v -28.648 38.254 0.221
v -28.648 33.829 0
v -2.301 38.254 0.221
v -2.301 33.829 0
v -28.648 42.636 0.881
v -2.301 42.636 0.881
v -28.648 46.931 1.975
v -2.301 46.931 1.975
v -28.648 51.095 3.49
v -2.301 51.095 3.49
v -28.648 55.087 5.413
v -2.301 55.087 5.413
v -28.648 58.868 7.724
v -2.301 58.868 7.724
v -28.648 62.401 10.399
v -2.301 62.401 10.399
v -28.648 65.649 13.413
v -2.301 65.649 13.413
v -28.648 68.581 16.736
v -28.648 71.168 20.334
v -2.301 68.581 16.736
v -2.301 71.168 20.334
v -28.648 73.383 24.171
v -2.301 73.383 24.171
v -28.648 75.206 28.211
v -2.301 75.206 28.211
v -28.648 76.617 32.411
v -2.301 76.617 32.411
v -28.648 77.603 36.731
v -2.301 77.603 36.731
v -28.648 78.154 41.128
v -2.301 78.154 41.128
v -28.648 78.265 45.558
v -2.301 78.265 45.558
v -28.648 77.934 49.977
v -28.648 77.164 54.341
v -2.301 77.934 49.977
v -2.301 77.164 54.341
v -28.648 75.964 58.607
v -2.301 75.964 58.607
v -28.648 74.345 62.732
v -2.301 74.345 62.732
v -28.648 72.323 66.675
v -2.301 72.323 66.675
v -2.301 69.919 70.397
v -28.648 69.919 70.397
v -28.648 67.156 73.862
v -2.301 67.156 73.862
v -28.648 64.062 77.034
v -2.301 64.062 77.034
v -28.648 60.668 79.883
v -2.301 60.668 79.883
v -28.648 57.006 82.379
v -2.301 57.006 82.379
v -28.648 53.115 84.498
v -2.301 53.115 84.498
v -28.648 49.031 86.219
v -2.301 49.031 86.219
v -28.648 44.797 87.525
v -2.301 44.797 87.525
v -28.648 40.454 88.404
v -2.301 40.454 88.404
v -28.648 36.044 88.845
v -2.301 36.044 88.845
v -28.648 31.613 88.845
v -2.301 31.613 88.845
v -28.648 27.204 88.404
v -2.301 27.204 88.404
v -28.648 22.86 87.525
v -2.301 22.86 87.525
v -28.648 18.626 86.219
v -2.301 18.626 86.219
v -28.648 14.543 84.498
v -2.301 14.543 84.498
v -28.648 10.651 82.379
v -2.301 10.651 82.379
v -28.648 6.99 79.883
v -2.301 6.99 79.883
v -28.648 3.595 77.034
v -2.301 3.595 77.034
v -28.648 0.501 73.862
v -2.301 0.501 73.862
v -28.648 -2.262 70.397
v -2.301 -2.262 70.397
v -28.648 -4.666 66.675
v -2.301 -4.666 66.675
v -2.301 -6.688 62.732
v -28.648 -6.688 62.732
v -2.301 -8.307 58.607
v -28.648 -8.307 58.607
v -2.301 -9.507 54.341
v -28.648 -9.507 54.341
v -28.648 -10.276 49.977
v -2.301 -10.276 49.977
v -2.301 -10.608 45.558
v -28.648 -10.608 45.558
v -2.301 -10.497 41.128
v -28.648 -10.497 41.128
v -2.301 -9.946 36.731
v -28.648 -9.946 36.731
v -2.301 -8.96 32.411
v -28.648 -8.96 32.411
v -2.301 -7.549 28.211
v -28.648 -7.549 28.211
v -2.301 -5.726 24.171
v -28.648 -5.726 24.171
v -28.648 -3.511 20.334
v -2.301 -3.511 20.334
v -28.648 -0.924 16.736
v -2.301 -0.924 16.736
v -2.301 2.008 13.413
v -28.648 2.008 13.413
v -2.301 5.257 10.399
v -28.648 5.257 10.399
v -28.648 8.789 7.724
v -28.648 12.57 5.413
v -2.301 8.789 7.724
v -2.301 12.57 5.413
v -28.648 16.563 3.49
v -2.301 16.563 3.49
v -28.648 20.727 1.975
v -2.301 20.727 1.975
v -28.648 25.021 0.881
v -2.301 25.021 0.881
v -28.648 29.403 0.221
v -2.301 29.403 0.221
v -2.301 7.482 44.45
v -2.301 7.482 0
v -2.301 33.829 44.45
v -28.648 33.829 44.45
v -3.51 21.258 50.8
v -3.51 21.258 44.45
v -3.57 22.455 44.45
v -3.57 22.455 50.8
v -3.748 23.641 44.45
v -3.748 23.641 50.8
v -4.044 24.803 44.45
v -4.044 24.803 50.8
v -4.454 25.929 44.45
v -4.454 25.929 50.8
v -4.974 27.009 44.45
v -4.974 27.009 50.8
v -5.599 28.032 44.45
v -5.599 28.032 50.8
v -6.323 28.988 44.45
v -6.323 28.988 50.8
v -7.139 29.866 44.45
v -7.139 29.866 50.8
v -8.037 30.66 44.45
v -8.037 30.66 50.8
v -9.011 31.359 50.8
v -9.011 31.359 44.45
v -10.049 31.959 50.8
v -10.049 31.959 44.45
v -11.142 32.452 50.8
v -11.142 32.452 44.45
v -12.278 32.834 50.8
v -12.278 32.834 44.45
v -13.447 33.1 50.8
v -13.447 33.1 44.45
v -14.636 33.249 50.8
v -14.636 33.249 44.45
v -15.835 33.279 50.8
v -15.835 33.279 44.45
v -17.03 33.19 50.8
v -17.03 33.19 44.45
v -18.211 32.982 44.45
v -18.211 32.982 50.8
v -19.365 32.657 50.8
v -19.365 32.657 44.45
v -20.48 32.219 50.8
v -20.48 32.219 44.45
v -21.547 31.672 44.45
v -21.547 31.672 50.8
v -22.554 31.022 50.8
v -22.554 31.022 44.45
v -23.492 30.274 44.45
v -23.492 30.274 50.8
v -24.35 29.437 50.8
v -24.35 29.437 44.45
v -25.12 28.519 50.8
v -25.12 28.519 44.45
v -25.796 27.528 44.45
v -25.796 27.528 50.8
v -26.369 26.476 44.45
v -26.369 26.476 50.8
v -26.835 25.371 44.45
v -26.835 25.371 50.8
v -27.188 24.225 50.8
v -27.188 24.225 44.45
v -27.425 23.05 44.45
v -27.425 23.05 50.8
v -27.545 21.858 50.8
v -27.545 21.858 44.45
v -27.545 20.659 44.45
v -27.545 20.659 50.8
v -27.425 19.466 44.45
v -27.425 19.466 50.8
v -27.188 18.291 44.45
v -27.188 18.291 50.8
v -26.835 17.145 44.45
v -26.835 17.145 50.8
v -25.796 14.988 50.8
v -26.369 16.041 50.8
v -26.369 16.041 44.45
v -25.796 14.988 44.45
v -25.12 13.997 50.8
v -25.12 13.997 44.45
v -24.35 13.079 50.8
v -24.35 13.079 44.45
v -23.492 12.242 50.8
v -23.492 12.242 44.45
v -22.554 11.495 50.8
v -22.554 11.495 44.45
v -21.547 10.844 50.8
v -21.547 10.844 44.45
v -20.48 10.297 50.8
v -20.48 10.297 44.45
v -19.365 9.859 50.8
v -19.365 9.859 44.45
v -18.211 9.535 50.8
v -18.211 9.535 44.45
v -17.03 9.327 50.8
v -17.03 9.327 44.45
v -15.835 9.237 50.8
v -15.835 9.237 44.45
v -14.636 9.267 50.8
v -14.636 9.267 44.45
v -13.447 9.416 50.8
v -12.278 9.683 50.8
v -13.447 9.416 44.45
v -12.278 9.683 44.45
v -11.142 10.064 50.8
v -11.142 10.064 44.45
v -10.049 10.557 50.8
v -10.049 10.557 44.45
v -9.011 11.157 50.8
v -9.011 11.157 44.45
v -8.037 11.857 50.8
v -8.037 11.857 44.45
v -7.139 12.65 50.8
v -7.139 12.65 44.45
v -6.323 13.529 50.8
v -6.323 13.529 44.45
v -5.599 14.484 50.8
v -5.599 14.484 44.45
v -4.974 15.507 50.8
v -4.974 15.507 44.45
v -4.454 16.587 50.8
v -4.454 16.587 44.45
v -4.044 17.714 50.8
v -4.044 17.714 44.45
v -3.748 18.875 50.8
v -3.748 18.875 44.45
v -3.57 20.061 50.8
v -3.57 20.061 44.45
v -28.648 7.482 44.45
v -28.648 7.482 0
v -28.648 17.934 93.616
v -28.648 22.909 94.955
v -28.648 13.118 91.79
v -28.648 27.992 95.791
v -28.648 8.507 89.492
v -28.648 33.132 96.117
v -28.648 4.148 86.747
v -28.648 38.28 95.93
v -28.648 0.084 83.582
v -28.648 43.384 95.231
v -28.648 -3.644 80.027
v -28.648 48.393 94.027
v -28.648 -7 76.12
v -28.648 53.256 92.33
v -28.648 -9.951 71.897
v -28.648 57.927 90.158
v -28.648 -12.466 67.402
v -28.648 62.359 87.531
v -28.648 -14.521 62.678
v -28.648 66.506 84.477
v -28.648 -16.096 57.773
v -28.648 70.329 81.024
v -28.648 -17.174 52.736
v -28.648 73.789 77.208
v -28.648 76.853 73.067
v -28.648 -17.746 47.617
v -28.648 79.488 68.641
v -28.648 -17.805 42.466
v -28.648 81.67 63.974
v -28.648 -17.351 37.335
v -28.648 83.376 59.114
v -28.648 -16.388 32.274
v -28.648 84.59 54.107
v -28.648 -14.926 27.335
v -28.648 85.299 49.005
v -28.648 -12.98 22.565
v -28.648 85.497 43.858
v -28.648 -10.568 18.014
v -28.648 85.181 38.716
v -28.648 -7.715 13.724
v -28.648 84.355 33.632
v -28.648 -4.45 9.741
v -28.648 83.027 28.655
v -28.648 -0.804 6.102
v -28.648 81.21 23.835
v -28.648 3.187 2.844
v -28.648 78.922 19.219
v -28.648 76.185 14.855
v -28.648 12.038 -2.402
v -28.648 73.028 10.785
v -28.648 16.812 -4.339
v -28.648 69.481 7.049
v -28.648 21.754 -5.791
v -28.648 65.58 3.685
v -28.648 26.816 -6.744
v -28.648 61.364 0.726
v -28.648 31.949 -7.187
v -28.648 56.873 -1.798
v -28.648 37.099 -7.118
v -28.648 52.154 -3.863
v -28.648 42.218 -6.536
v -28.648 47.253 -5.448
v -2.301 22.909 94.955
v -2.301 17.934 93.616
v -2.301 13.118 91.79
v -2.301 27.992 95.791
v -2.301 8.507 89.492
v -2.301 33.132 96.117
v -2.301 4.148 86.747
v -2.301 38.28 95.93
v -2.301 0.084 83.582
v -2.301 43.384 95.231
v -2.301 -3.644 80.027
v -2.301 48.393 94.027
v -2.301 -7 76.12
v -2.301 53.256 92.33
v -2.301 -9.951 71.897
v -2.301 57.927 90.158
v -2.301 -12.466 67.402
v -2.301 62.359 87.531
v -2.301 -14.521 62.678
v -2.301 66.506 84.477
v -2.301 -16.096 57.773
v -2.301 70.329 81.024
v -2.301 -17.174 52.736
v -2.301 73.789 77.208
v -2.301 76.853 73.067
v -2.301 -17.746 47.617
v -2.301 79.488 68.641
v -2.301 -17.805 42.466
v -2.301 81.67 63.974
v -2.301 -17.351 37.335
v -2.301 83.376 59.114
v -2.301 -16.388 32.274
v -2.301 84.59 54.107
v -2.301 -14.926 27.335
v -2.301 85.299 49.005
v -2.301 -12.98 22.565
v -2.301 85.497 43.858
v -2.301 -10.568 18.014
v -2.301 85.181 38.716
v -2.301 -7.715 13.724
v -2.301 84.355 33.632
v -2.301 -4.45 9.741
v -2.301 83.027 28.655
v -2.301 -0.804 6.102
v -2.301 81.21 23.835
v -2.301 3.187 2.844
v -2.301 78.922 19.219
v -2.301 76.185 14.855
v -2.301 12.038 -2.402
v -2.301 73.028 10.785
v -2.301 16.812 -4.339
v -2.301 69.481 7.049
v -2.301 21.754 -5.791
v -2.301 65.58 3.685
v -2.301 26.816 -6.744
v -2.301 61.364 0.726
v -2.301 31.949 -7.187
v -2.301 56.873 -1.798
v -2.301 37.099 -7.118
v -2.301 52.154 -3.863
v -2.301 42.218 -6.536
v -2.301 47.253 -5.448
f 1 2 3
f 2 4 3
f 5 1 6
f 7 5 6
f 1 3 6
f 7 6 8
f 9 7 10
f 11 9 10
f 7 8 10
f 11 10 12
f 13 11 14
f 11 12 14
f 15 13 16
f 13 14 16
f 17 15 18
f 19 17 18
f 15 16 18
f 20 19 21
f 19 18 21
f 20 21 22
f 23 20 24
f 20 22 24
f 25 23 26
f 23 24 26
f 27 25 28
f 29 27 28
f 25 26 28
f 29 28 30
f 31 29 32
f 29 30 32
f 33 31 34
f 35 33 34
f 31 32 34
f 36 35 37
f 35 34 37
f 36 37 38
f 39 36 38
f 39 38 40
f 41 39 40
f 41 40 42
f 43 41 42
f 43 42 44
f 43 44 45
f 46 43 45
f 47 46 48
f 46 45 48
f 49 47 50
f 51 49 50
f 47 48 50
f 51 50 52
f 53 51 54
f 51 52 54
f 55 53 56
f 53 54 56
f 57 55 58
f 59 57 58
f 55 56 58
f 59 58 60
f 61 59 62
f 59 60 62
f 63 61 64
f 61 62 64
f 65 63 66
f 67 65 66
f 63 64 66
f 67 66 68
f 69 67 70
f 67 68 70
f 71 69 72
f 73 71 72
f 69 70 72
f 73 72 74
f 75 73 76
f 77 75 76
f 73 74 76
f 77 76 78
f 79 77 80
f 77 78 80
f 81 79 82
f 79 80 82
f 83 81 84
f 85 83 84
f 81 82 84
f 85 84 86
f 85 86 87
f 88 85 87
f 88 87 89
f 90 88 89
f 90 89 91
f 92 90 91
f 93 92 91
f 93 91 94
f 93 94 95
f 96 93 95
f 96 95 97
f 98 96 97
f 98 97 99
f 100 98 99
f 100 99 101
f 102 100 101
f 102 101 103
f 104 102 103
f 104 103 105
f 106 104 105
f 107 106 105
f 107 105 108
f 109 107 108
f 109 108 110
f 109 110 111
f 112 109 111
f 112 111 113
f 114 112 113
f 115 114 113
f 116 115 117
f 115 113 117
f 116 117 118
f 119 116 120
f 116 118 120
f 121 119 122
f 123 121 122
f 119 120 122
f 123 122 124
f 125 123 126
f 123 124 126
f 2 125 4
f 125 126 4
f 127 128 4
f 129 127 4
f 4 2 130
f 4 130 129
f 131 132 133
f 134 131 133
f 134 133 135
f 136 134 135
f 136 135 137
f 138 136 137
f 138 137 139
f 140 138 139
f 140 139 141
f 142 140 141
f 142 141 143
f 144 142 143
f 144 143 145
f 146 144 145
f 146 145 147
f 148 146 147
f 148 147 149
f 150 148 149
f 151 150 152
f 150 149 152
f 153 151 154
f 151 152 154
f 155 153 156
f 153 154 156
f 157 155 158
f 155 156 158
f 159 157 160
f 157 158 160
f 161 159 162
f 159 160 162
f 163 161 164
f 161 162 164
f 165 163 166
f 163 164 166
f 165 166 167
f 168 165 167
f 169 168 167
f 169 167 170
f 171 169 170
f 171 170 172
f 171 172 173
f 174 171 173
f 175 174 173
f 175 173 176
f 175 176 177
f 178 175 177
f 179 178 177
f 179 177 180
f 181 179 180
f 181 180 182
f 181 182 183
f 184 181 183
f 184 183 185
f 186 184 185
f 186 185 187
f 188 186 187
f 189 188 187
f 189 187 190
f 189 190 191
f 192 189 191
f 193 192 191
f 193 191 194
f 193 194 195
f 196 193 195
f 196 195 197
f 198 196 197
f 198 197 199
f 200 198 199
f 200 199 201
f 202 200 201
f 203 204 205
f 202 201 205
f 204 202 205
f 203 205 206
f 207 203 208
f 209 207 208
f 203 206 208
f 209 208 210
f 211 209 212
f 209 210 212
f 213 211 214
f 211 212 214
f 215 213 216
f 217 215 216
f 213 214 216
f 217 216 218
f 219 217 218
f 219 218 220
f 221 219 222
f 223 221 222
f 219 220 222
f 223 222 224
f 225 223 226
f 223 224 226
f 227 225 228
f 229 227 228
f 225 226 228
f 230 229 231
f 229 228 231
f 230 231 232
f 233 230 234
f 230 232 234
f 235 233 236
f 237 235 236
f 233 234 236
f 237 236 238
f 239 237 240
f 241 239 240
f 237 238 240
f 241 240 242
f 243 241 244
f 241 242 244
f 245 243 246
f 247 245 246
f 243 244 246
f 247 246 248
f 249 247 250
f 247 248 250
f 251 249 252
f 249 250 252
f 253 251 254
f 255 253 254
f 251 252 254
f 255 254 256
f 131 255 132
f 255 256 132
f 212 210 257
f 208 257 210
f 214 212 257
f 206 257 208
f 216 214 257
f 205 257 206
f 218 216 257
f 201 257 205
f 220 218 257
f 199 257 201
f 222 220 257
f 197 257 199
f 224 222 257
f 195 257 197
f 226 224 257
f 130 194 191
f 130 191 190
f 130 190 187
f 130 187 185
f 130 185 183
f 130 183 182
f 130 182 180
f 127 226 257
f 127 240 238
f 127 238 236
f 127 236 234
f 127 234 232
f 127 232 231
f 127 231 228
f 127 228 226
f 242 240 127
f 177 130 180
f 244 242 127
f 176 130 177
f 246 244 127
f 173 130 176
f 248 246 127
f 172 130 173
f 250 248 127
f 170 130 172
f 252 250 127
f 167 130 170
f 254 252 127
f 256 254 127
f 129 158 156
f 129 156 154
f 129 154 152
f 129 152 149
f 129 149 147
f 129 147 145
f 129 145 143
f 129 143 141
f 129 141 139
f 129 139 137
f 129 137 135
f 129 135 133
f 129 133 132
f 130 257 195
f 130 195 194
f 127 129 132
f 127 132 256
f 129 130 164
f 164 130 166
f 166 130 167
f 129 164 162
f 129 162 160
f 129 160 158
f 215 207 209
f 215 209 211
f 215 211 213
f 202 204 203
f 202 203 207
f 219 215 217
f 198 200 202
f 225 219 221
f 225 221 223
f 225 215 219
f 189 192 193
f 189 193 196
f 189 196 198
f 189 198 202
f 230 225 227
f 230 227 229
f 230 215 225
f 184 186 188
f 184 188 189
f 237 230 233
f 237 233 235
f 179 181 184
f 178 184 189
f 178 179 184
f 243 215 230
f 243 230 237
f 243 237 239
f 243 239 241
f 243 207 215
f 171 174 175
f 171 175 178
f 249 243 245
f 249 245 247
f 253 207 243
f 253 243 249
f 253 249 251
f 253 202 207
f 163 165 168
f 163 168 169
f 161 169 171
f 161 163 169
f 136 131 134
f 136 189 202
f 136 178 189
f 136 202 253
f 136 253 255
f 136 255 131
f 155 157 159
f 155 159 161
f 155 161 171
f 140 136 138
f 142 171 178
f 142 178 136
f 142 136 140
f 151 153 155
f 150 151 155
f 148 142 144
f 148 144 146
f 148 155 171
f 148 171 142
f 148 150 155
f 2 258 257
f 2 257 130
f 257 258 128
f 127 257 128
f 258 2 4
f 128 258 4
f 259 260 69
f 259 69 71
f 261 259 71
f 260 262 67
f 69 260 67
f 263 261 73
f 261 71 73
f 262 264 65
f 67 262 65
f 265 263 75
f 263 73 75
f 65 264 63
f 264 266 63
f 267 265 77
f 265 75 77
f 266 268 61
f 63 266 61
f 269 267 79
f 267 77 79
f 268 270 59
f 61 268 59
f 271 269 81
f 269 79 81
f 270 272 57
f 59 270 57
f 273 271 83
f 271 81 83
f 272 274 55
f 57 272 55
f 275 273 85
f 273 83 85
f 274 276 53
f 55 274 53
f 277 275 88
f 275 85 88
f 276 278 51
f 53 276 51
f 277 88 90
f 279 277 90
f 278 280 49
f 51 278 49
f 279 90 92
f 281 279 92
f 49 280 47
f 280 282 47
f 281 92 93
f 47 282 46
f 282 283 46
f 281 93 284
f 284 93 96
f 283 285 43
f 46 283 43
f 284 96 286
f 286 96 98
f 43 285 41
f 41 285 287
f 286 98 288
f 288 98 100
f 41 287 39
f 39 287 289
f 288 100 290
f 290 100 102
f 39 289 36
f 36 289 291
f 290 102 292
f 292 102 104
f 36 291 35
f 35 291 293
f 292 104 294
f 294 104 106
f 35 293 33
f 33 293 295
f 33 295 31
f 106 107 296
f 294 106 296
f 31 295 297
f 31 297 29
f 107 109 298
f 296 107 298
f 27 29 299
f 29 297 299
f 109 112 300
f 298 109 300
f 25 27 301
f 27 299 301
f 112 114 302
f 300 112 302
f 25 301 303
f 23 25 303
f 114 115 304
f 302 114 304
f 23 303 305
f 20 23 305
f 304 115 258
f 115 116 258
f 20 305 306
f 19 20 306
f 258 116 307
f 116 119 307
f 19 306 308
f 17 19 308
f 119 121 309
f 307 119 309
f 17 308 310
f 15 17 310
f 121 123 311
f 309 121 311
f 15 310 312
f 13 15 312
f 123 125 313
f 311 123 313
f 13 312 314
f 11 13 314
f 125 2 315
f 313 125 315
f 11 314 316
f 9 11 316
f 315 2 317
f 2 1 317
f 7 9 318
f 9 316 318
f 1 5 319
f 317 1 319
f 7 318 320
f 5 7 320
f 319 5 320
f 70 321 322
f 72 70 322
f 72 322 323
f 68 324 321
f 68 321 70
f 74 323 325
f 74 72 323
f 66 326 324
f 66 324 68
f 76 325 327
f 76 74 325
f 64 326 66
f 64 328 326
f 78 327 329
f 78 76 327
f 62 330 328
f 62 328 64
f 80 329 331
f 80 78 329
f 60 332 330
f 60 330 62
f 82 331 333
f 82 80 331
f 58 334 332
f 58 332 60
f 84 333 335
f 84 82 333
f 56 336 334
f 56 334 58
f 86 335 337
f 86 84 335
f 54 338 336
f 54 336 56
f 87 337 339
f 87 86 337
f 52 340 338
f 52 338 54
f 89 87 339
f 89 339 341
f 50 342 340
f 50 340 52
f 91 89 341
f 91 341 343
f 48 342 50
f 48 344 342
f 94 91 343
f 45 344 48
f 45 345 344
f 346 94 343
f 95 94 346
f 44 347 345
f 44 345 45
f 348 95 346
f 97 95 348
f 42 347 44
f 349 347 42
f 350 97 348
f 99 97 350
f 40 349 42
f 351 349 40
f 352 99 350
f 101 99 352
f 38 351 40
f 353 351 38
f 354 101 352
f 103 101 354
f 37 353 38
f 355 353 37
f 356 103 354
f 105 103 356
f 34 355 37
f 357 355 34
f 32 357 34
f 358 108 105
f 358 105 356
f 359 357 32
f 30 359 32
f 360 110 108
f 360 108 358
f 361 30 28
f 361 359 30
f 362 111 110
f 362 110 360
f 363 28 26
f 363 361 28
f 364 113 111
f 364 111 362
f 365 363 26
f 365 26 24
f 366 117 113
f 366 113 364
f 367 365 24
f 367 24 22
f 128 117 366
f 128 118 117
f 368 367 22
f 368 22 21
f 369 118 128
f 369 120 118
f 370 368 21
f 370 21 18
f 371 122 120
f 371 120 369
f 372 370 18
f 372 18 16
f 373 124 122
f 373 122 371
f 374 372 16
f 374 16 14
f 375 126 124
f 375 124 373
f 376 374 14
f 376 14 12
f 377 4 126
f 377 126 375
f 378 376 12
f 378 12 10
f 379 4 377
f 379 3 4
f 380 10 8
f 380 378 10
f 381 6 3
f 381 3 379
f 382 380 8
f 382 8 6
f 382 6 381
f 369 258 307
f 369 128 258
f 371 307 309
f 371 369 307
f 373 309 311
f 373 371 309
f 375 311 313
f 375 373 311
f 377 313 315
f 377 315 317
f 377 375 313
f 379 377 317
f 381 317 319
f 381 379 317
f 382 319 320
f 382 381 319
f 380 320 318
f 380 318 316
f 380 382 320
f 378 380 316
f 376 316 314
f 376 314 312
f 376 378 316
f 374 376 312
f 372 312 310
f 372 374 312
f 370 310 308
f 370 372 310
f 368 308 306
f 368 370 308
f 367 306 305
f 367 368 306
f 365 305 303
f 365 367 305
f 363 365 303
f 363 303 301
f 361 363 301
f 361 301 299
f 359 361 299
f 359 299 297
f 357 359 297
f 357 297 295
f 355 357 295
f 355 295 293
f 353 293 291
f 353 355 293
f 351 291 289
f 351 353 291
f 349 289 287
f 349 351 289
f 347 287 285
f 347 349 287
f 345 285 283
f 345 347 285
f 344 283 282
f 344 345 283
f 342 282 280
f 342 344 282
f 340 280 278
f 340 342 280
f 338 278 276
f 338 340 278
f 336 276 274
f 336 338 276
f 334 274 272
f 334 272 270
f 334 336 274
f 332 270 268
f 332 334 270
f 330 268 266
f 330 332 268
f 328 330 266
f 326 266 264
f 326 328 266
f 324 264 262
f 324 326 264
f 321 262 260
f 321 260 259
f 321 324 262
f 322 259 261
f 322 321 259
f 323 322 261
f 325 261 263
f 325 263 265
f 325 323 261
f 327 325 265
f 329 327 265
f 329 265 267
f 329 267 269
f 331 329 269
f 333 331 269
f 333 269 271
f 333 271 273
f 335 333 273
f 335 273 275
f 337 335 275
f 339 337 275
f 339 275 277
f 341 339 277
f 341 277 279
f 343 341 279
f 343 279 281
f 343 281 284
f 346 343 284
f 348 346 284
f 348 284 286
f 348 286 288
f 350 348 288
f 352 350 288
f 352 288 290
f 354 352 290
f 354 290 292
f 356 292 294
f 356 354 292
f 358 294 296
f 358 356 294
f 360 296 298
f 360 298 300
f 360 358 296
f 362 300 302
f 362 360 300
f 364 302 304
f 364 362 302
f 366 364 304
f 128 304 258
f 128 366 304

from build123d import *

# Parameters (mm, degrees)
F1_R     = 12.0249392967
F2_DEPTH = 50.8
F0_W     = 26.346960105
F0_H     = 26.346960105
F3_DEPTH = 44.45


# Not quite as in the source:
# - the program builds the solid bodies; features that only make, move or delete a surface that nothing else refers to are left out


with BuildPart() as f2:
    # F1 (on Top) → F2 (new body)
    with BuildSketch(Plane.XY):
        with Locations((-15.5347883701, 21.2581306696)):
            Circle(F1_R)
    extrude(amount=F2_DEPTH)

    # F0 (on Top) → F3 (join)
    with BuildSketch(Plane.XY):
        with Locations((-15.4747529887, 20.6551658921)):
            Rectangle(F0_W, F0_H)
    extrude(amount=F3_DEPTH)


with BuildPart() as f5:
    # F0 (on Top) → F5 (revolve)
    with BuildSketch(Plane.XY):
        with Locations((-15.4747529887, 20.6551658921)):
            Rectangle(F0_W, F0_H)
    revolve(axis=Axis((-15.4747529887, 33.8286459446, 44.45), (1, 0, 0)))


solid = Compound([f2.part, f5.part])
